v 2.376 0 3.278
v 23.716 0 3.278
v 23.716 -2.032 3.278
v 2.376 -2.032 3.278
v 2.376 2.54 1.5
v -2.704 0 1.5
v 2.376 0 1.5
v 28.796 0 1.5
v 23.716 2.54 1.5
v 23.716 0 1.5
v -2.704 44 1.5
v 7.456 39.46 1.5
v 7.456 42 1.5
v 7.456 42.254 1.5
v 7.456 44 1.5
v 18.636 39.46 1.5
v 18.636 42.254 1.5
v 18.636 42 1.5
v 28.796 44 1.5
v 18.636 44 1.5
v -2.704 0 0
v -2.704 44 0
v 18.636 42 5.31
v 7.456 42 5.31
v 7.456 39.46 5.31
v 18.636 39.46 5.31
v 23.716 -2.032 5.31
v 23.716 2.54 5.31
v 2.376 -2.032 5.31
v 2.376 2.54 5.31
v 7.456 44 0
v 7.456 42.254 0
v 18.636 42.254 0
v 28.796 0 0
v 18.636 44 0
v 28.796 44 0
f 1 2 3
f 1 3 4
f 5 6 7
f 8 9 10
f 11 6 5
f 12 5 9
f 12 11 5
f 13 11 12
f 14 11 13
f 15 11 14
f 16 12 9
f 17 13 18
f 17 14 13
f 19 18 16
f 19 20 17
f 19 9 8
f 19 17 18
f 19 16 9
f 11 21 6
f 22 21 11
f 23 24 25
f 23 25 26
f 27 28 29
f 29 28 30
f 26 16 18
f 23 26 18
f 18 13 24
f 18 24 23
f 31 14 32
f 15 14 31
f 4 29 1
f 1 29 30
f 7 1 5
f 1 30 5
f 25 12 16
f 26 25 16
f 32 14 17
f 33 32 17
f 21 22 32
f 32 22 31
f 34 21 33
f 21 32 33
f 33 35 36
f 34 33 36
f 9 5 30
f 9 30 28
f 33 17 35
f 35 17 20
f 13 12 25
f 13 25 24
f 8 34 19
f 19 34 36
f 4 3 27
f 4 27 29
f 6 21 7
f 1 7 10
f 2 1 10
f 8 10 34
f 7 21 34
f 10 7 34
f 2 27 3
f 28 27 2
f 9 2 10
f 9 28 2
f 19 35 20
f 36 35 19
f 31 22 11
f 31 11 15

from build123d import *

# Parameters (mm, degrees)
SKETCH1_W           = 31.5
SKETCH1_H           = 44
BOSS_EXTRUDE1_DEPTH = 1.5
SKETCH2_W           = 11.18
SKETCH2_H           = 2.54
BOSS_EXTRUDE2_DEPTH = 3.81
SKETCH4_W           = 11.18
SKETCH4_H           = 1.746
CUT_EXTRUDE1_DEPTH  = 3.81
SKETCH5_W           = 21.34
SKETCH5_H           = 2.54
BOSS_EXTRUDE3_DEPTH = 3.81
SKETCH8_W           = 21.34
SKETCH8_H           = 2.032
BOSS_EXTRUDE4_DEPTH = 2.032


with BuildPart() as part:
    # Sketch1 → Boss-Extrude1 (new body)
    with BuildSketch(Plane.XY):
        with Locations((13.046077502, 22)):
            Rectangle(SKETCH1_W, SKETCH1_H)
    extrude(amount=BOSS_EXTRUDE1_DEPTH)

    # Sketch2 → Boss-Extrude2 (add)
    with BuildSketch(Plane.XY.offset(1.5)):
        with Locations((13.046077502, 40.73)):
            Rectangle(SKETCH2_W, SKETCH2_H)
    extrude(amount=BOSS_EXTRUDE2_DEPTH)

    # Sketch4 → Cut-Extrude1 (cut)
    with BuildSketch(Plane.XY.offset(1.5)):
        with Locations((13.046077502, 43.127)):
            Rectangle(SKETCH4_W, SKETCH4_H)
    extrude(amount=-CUT_EXTRUDE1_DEPTH, mode=Mode.SUBTRACT)

    # Sketch5 → Boss-Extrude3 (add)
    with BuildSketch(Plane.XY.offset(1.5)):
        with Locations((13.046077502, 1.27)):
            Rectangle(SKETCH5_W, SKETCH5_H)
    extrude(amount=BOSS_EXTRUDE3_DEPTH)

    # Sketch8 → Boss-Extrude4 (add)
    with BuildSketch(Plane(origin=(0, 0, 0), x_dir=(-1, 0, 0), z_dir=(0, -1, 0))):
        with Locations((-13.046077502, -4.294)):
            Rectangle(SKETCH8_W, SKETCH8_H)
    extrude(amount=BOSS_EXTRUDE4_DEPTH)


solid = part.part
